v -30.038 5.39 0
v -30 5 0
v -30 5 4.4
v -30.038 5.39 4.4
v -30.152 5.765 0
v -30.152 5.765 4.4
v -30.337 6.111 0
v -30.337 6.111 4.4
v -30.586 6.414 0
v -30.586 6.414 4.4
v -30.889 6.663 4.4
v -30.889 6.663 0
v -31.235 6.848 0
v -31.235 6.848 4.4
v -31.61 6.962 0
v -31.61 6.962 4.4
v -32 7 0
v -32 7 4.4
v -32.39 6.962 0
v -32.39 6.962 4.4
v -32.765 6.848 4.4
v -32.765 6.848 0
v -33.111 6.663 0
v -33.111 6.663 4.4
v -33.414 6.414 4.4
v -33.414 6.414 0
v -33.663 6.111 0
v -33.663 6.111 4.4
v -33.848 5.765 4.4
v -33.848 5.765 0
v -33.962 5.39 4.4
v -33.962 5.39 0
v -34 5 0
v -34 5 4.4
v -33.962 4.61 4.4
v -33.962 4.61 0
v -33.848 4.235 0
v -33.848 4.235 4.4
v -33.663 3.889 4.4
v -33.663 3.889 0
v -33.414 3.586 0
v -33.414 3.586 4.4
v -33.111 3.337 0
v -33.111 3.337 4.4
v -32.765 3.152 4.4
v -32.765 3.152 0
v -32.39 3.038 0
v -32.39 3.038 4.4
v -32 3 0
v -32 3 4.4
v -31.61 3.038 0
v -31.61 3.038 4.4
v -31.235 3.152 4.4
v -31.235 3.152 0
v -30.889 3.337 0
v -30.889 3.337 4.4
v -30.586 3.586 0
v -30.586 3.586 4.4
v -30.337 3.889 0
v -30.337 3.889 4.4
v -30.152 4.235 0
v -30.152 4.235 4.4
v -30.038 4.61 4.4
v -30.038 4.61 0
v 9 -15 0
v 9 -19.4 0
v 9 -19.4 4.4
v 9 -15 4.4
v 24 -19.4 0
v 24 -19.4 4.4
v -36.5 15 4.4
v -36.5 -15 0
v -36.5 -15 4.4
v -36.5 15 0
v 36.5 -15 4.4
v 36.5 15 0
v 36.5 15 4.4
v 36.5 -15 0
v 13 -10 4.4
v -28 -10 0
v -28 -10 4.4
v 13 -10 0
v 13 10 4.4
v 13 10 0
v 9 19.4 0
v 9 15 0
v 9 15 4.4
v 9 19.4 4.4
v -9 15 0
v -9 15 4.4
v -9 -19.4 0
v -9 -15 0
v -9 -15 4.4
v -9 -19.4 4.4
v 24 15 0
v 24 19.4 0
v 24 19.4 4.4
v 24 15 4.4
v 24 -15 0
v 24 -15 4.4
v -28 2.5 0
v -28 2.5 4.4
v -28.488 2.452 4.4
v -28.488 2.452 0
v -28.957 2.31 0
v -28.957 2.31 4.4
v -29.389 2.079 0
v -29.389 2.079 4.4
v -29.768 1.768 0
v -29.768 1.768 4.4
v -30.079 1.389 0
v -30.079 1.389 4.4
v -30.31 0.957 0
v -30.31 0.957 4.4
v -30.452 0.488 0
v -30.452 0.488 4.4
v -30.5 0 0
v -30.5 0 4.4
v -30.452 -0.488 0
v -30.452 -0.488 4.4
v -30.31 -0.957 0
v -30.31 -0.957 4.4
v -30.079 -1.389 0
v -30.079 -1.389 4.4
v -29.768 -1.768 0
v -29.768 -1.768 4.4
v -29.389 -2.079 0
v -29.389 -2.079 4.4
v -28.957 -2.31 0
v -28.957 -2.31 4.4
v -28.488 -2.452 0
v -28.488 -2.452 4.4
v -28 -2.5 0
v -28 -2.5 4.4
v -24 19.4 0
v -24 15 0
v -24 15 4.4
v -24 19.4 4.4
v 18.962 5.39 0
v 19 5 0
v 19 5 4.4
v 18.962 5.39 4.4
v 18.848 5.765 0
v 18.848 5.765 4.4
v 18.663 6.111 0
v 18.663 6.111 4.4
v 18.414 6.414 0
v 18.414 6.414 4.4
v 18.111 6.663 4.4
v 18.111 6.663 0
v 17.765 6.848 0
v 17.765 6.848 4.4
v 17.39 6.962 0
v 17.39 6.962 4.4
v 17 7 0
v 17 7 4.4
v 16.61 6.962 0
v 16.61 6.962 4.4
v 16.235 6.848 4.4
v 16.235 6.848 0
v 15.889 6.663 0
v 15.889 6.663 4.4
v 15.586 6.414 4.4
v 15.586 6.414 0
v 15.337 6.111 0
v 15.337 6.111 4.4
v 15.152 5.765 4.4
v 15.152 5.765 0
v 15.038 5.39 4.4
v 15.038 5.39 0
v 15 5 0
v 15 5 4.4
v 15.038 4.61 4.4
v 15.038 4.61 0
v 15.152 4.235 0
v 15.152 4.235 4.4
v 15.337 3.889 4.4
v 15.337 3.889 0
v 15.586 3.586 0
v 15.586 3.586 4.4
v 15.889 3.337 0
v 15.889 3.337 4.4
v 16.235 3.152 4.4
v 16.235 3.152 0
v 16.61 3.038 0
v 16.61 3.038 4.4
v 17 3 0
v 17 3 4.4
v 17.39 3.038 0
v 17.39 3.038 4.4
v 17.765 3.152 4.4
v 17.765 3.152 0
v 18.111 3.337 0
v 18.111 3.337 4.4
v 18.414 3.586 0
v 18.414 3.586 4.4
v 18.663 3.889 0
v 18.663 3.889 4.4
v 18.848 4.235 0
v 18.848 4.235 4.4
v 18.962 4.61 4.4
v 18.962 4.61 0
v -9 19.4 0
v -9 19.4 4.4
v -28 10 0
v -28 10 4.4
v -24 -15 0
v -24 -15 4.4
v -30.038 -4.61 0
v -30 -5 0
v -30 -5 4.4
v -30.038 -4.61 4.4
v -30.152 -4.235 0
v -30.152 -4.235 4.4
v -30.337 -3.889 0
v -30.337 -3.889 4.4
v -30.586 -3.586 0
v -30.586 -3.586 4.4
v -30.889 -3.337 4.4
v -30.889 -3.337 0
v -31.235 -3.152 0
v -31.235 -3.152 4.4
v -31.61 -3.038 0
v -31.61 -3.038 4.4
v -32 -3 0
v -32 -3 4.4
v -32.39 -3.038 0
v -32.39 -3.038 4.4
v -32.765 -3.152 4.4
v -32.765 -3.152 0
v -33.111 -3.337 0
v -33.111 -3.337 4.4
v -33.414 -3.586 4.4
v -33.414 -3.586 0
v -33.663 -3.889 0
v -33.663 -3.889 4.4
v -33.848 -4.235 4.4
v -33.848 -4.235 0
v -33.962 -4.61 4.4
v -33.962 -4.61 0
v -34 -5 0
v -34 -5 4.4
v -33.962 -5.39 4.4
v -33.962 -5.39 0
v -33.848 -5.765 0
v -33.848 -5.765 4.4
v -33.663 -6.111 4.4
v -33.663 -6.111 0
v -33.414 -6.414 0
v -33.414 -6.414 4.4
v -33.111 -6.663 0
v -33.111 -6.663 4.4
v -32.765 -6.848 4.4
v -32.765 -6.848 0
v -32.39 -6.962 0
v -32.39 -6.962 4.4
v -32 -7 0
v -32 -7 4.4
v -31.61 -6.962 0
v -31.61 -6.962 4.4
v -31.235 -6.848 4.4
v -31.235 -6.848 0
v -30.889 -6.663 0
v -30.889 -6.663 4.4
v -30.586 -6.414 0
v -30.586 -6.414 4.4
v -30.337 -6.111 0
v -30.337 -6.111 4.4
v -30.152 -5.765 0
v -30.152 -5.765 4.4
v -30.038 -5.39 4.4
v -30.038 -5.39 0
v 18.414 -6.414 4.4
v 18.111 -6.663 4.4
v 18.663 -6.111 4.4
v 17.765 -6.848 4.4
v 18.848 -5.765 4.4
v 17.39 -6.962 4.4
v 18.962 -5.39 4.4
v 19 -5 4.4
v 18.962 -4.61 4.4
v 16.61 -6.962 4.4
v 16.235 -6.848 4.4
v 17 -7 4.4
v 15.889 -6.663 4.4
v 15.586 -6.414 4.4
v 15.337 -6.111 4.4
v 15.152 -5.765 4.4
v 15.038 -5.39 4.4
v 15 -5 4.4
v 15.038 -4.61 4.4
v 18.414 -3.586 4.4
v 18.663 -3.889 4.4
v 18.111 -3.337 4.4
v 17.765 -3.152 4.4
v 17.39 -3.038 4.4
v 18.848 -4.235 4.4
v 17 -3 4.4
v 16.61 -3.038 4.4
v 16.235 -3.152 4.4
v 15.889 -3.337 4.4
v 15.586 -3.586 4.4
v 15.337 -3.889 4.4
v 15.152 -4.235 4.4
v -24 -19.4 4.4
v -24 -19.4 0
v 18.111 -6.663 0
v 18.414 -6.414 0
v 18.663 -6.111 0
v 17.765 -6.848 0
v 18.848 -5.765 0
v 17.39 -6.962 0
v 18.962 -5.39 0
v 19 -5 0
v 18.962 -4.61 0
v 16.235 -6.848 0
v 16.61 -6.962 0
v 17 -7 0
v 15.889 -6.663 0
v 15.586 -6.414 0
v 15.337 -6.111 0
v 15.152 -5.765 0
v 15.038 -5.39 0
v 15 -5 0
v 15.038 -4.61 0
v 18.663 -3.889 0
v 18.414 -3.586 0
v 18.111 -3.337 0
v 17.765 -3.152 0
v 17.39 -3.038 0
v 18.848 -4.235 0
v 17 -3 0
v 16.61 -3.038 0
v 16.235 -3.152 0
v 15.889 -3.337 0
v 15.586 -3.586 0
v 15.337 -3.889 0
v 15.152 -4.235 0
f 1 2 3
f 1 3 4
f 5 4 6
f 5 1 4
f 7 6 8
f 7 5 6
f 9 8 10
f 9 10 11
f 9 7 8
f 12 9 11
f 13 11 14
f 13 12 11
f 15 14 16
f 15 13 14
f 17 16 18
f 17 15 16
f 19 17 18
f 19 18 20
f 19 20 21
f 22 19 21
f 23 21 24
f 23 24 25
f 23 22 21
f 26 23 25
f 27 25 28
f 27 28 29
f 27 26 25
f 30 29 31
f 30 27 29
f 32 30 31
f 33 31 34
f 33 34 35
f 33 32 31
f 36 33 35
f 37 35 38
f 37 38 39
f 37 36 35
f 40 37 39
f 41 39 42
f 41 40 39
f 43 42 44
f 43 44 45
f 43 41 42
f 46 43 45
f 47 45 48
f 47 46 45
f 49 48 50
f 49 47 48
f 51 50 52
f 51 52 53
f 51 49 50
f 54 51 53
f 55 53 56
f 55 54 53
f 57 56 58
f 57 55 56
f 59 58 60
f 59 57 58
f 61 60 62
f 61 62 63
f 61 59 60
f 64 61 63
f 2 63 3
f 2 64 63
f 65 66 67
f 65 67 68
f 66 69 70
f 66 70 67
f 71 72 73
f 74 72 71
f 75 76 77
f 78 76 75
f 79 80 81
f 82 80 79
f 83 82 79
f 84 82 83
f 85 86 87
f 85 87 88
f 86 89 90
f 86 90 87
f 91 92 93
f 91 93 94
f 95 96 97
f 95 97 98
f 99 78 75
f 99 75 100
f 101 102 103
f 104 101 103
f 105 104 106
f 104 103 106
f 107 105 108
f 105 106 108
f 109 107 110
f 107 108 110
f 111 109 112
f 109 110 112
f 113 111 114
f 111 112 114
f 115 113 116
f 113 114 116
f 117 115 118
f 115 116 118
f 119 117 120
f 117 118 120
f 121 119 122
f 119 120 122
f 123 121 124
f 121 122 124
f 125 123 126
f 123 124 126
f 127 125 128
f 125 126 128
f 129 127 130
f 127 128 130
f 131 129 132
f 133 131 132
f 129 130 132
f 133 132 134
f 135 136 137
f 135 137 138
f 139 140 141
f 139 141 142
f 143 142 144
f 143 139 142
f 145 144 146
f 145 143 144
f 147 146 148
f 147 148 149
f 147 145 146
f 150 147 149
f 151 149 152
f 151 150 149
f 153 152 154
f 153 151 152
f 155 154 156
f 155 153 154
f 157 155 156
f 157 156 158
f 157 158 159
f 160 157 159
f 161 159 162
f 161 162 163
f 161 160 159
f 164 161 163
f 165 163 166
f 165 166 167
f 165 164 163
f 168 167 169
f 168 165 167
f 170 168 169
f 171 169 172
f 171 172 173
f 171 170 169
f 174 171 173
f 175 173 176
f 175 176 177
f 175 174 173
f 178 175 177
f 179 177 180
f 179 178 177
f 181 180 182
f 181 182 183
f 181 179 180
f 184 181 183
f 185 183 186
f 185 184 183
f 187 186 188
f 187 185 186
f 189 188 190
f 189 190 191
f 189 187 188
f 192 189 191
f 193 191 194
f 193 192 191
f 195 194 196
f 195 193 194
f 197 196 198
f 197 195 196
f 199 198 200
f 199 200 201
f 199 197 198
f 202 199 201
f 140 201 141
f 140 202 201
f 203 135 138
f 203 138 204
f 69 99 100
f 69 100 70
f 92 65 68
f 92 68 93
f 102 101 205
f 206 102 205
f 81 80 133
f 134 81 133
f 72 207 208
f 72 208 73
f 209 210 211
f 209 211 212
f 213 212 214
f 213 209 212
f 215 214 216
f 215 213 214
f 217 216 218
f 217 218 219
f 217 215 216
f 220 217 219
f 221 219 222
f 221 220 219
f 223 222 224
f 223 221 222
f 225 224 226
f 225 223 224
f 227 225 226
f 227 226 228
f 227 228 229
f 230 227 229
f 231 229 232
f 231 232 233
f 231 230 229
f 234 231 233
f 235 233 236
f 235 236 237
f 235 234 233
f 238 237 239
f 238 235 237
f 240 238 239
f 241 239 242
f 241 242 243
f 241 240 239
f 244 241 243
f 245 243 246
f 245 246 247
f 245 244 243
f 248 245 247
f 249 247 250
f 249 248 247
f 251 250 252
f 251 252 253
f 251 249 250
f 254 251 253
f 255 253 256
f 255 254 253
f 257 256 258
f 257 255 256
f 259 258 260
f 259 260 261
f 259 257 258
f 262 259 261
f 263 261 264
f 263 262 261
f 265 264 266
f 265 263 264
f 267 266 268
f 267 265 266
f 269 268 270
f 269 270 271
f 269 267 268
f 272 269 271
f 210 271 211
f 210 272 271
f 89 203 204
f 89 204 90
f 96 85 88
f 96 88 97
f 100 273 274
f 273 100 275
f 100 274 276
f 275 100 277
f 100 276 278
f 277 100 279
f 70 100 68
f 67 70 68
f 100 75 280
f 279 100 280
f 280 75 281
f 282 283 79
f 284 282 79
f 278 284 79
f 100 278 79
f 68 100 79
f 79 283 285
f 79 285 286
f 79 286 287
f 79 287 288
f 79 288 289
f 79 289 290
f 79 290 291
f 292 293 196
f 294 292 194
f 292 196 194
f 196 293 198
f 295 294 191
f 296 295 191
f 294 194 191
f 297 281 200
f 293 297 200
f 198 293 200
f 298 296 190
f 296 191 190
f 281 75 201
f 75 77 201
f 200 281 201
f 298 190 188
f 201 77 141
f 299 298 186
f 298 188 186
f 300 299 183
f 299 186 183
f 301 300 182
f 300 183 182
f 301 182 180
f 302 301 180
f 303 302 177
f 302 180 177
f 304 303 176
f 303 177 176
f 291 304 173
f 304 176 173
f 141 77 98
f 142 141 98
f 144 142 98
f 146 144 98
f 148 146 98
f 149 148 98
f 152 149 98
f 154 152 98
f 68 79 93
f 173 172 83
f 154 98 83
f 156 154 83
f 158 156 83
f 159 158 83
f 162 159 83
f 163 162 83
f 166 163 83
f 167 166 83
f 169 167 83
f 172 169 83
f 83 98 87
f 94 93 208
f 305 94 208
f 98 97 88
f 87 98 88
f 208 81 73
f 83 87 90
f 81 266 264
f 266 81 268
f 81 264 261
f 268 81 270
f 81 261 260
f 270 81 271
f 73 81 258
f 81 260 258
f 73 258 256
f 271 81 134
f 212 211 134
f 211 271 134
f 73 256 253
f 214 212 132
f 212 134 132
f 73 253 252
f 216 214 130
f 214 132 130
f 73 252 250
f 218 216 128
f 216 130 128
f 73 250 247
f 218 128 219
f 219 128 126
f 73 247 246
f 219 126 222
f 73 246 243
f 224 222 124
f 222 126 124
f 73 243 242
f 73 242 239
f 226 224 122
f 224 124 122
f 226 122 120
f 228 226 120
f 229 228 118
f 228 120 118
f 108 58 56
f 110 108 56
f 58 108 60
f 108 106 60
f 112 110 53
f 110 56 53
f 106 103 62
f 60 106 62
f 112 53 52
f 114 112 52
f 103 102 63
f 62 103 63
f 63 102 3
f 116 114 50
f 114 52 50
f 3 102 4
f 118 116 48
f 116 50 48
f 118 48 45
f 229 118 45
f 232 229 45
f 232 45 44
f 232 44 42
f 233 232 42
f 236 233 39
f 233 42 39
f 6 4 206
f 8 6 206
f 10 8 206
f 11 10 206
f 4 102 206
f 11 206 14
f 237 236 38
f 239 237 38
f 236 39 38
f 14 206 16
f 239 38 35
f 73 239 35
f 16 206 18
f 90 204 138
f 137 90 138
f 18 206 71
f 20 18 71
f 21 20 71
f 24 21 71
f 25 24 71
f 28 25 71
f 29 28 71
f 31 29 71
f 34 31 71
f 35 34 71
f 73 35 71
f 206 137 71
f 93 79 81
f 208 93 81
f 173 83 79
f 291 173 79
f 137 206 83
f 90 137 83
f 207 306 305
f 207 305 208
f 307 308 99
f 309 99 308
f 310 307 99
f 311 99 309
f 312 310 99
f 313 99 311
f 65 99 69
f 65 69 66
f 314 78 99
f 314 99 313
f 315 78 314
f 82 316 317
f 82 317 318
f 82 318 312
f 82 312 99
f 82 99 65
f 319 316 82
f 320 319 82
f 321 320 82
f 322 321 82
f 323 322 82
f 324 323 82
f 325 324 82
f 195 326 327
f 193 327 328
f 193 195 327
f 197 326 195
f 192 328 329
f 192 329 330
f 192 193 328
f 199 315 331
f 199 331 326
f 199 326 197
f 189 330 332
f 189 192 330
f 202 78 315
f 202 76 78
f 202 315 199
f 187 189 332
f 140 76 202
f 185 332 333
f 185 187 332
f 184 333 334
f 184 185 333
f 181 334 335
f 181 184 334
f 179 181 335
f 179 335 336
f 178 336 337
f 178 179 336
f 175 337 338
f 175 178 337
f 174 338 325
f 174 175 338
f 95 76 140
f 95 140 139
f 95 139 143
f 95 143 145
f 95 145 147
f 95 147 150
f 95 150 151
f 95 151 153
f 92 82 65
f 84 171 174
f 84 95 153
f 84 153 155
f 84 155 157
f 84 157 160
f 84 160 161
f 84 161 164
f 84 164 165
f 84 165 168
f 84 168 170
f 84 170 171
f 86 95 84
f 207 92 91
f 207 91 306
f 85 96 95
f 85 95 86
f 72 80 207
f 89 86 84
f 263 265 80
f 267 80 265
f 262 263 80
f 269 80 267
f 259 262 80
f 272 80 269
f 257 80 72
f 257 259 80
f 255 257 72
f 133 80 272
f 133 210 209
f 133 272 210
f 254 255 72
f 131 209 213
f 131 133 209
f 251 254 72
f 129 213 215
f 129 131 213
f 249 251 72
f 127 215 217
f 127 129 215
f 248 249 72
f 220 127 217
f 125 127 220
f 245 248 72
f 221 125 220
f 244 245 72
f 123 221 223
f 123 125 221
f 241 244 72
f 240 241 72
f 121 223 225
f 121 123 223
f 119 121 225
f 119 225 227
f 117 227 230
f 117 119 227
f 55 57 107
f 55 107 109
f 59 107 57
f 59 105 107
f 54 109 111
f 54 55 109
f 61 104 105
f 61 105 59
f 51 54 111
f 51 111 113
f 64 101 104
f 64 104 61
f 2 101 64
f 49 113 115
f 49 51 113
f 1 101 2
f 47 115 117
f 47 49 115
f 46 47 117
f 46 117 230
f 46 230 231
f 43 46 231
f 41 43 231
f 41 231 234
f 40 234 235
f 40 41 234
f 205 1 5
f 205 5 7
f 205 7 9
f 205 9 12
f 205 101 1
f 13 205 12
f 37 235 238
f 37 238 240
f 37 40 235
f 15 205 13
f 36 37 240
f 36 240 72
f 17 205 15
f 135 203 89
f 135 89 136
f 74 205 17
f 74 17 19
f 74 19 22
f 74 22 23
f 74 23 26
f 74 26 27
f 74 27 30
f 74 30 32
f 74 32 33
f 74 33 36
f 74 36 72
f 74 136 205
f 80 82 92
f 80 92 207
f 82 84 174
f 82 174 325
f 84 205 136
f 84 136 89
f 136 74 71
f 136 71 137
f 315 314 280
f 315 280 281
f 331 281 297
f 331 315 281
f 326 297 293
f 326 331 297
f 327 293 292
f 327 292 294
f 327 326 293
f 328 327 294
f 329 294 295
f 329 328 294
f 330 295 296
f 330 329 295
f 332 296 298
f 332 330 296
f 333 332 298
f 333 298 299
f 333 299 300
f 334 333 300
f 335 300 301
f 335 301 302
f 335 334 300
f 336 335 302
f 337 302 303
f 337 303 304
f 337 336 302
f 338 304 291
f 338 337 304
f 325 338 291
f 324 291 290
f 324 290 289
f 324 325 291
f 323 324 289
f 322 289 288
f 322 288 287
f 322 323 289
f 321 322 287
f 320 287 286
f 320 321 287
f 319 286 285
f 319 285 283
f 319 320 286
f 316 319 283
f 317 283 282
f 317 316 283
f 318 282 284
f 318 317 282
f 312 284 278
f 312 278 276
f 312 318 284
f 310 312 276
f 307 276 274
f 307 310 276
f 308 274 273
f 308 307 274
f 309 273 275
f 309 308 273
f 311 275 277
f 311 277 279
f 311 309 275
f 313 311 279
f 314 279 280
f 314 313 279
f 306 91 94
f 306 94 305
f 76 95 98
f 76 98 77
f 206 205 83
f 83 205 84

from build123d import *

# Parameters (mm, degrees)
SKETCH_1_R          = 2
SKETCH_1_W          = 41
SKETCH_1_H          = 20
EXTRUDE_1_DEPTH     = 4.4
SKETCH_2_R          = 2.5
CUT_EXTRUDE_1_DEPTH = 4.4


with BuildPart() as part:
    # 草图1 → 凸台-拉伸1 (new body)
    with BuildSketch(Plane.XY):
        Polygon((9, 15), (9, 19.4), (24, 19.4), (24, 15), (36.5, 15), (36.5, -15), (24, -15), (24, -19.4), (9, -19.4), (9, -15), (-9, -15), (-9, -19.4), (-24, -19.4), (-24, -15), (-36.5, -15), (-36.5, 15), (-24, 15), (-24, 19.4), (-9, 19.4), (-9, 15), align=None)
        with Locations((-32, 5)):
            Circle(SKETCH_1_R, mode=Mode.SUBTRACT)
        with Locations((-32, -5)):
            Circle(SKETCH_1_R, mode=Mode.SUBTRACT)
        with Locations((17, -5)):
            Circle(SKETCH_1_R, mode=Mode.SUBTRACT)
        with Locations((17, 5)):
            Circle(SKETCH_1_R, mode=Mode.SUBTRACT)
        with Locations((-7.5, 0)):
            Rectangle(SKETCH_1_W, SKETCH_1_H, mode=Mode.SUBTRACT)
    extrude(amount=EXTRUDE_1_DEPTH)

    # 草图2 → 切除-拉伸1 (cut)
    with BuildSketch(Plane.XY.offset(4.4)):
        with Locations((-28, 0)):
            Circle(SKETCH_2_R)
    extrude(amount=-CUT_EXTRUDE_1_DEPTH, mode=Mode.SUBTRACT)


solid = part.part
